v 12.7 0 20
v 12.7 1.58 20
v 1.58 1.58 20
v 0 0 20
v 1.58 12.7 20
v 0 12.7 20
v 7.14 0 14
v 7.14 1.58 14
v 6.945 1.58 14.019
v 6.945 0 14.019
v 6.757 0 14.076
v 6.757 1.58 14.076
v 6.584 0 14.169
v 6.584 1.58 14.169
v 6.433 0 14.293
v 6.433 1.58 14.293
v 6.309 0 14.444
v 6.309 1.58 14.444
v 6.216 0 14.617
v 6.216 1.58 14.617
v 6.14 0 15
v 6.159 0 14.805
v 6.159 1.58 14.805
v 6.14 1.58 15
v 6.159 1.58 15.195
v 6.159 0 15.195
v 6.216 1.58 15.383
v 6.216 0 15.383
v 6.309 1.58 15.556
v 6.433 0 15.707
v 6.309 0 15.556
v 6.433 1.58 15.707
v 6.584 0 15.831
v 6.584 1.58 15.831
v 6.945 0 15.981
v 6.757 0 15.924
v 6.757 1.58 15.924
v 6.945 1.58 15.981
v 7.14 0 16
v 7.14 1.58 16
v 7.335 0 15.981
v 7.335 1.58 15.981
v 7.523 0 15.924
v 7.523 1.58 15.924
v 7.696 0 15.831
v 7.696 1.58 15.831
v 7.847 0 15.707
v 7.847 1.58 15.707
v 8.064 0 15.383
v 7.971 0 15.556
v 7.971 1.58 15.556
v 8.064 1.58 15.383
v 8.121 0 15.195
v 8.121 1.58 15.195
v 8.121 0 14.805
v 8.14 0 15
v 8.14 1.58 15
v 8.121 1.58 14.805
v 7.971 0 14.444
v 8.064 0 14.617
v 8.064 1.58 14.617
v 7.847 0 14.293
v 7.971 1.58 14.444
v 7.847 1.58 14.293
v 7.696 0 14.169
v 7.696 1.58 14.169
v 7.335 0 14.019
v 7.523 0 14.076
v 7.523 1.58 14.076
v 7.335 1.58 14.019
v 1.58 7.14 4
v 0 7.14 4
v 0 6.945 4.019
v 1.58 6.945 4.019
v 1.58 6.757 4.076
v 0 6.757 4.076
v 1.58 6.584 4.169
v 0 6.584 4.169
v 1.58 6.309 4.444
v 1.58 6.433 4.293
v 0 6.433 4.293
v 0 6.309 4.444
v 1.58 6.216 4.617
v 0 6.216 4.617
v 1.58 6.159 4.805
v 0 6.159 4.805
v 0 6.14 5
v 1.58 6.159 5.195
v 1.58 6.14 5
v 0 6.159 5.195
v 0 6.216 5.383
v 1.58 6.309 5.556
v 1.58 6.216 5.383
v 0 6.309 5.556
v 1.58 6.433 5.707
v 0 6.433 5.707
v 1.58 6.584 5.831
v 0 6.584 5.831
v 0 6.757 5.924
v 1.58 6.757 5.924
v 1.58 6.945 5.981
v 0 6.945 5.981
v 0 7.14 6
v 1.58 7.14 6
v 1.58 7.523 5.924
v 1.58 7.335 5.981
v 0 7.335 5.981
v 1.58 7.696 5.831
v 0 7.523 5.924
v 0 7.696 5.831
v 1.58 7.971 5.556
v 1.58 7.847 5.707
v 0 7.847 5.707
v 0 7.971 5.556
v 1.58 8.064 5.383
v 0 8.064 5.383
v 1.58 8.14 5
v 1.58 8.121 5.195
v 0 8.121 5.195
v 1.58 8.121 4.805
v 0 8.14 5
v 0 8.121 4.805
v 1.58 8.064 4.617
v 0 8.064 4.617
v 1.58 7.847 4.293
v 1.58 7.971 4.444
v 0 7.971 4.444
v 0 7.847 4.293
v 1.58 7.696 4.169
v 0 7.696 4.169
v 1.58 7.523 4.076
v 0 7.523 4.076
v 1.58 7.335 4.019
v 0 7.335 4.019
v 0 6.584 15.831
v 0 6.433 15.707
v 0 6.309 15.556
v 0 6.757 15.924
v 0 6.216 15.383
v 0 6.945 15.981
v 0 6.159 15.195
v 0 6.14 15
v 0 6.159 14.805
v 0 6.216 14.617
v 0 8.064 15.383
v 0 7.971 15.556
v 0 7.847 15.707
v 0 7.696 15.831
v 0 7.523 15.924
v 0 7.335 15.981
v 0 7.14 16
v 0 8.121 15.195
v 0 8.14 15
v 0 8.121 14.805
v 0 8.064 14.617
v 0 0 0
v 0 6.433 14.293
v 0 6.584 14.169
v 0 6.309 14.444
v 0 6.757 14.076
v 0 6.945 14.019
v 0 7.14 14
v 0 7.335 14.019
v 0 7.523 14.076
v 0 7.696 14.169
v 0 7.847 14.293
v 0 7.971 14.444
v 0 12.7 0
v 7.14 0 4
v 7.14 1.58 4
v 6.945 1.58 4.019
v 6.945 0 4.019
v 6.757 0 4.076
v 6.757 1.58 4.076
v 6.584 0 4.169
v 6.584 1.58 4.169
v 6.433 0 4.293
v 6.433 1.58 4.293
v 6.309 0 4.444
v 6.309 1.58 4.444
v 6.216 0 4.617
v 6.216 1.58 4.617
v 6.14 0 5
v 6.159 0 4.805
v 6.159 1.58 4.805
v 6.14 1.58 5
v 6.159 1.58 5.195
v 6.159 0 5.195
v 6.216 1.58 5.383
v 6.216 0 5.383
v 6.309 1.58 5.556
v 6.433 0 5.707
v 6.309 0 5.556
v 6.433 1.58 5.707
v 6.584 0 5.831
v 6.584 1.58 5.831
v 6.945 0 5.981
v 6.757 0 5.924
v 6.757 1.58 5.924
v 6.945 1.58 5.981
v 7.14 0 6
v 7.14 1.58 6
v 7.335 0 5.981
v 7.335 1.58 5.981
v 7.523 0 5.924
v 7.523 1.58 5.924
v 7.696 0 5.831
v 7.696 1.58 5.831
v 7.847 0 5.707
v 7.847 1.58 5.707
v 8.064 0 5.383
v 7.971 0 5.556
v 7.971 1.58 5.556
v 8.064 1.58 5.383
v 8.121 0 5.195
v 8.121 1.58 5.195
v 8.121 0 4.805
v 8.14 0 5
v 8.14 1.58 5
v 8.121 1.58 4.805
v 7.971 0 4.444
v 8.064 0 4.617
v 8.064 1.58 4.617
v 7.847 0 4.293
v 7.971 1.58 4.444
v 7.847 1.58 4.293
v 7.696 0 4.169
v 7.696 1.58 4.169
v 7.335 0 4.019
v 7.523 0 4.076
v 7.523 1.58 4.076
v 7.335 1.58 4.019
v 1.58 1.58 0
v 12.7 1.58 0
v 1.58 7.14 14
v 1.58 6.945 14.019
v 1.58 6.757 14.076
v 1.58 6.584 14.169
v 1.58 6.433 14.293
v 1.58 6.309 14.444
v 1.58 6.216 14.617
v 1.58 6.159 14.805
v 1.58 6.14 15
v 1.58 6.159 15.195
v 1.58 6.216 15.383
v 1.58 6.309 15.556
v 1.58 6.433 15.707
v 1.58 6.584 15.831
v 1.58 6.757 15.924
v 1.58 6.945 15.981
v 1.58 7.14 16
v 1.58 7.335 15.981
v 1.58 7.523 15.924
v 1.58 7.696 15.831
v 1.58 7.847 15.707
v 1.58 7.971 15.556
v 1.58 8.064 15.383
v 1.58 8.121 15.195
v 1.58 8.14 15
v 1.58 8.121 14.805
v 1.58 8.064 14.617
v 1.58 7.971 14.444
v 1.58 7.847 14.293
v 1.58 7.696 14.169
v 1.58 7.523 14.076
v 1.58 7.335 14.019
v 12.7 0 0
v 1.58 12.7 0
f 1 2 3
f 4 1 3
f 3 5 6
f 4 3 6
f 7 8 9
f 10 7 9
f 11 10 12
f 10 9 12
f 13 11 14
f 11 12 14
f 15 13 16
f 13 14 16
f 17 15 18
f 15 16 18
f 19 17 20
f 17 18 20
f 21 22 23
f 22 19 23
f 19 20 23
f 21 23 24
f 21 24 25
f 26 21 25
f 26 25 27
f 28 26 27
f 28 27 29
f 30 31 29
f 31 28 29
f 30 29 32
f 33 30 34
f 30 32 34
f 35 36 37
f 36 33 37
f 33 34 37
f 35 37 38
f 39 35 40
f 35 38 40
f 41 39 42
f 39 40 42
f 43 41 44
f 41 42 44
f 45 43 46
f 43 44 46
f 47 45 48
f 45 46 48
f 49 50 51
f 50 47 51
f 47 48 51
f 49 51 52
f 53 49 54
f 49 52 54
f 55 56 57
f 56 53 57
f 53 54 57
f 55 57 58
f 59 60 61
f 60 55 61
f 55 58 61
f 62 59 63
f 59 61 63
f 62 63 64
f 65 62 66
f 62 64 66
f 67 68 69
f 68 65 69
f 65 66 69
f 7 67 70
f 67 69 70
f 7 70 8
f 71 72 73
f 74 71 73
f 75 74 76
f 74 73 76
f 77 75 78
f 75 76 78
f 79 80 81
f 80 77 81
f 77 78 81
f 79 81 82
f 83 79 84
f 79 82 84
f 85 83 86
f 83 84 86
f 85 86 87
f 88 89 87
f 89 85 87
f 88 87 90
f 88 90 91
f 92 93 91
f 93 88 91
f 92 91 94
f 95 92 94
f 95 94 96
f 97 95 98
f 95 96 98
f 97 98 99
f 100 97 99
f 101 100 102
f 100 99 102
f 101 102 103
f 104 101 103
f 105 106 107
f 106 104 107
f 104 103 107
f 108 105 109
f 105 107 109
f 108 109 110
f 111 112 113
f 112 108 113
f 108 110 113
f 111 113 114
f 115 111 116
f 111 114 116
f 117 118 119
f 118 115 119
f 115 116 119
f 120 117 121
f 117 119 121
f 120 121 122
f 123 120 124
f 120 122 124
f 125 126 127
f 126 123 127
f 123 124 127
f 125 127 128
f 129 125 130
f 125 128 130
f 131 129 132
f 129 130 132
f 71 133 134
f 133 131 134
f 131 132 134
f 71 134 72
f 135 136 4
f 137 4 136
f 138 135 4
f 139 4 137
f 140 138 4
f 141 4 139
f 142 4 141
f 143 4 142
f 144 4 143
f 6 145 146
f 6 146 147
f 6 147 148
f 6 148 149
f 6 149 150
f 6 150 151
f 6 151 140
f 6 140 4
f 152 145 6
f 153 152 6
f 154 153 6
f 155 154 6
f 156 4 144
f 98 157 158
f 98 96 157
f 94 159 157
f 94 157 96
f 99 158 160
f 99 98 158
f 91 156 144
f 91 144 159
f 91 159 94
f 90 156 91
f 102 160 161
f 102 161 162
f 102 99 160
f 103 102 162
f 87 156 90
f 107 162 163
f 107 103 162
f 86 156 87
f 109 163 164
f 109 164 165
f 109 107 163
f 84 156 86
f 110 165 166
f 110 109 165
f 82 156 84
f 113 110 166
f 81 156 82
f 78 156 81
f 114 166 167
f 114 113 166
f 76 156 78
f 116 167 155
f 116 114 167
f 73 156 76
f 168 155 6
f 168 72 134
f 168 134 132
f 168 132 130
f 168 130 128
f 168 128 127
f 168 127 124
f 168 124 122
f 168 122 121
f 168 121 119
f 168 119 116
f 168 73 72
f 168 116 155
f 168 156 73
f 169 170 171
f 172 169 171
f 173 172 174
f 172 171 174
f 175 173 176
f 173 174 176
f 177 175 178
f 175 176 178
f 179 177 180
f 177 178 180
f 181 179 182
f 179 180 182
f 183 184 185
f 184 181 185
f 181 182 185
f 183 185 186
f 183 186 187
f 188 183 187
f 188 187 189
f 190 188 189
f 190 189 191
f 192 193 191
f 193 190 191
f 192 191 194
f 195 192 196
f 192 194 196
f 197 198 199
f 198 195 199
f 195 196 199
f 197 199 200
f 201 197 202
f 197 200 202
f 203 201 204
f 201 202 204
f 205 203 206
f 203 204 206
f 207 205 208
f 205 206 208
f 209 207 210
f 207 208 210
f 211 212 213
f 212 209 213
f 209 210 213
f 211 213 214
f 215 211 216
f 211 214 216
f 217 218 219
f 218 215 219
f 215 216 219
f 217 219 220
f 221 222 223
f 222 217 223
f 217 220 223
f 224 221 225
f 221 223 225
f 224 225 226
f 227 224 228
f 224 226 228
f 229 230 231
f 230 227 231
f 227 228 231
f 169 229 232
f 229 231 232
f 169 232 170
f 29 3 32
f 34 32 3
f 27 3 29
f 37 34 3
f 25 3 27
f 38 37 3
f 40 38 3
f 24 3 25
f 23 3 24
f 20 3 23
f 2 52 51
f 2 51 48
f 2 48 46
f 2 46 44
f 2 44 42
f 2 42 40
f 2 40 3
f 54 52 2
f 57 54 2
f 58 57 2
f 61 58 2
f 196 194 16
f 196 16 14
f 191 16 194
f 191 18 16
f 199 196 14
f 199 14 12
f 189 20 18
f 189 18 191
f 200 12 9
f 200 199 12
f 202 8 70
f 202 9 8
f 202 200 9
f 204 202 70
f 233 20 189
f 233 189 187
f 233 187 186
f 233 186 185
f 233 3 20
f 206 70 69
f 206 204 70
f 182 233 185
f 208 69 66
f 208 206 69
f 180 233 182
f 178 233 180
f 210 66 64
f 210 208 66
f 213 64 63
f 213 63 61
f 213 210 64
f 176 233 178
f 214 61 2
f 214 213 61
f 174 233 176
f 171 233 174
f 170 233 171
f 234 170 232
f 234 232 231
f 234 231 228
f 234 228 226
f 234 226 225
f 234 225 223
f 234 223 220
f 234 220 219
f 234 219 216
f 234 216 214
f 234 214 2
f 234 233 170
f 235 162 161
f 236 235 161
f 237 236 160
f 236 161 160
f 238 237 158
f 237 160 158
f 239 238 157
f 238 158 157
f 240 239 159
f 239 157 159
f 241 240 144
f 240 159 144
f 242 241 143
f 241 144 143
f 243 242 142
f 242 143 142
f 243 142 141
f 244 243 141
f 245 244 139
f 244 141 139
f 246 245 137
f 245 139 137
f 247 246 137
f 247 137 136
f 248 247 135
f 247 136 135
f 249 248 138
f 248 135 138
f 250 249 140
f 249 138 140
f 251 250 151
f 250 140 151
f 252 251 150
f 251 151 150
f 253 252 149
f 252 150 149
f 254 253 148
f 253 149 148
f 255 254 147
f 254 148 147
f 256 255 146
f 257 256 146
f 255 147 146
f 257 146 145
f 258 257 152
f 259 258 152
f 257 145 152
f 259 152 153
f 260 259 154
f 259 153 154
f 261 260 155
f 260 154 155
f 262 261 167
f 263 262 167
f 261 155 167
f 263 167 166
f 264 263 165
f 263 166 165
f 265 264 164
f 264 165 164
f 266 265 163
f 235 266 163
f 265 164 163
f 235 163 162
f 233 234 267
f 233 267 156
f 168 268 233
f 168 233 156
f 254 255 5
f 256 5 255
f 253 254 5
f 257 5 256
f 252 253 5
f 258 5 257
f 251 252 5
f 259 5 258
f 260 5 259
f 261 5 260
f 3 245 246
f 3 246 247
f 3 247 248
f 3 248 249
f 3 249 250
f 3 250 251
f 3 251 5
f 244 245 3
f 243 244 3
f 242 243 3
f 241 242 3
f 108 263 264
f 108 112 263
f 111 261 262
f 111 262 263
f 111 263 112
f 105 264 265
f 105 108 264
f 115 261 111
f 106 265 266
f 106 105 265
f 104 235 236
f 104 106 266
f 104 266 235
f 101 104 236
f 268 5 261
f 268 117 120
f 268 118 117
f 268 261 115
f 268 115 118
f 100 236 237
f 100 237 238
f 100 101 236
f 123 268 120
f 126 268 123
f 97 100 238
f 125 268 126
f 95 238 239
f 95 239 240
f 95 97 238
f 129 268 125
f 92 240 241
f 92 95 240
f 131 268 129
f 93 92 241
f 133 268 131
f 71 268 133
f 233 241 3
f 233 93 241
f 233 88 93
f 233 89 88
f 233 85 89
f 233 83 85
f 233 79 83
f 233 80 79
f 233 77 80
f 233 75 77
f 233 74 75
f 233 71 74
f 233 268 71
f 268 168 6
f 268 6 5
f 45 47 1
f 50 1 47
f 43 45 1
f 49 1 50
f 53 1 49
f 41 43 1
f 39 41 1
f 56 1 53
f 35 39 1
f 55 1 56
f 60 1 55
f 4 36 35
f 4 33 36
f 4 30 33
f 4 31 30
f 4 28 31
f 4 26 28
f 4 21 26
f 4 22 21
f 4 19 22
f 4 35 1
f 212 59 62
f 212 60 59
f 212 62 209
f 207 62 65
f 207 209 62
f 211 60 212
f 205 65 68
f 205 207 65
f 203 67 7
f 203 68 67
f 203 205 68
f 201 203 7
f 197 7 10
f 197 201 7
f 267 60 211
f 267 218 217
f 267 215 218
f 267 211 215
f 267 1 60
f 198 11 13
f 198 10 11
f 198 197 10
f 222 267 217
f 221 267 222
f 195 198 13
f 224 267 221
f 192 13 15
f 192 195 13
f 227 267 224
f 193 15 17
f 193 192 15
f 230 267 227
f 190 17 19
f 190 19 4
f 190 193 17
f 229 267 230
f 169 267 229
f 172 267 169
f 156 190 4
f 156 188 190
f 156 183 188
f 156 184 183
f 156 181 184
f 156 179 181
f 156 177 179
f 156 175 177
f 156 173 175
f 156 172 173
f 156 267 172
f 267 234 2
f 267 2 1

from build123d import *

# Parameters (mm, degrees)
BOSS_EXTRUDE1_DEPTH = 20
CUT_EXTRUDE1_REACH  = 28.881
CIRPATTERN1_COUNT   = 2
CIRPATTERN1_ANGLE   = 90


with BuildPart() as part:
    # Sketch1 → Boss-Extrude1 (new body)
    with BuildSketch(Plane.XY):
        Polygon((0, 0), (0, 12.7), (1.58, 12.7), (1.58, 1.58), (12.7, 1.58), (12.7, 0), align=None)
    extrude(amount=BOSS_EXTRUDE1_DEPTH)

    # Sketch2 → Cut-Extrude1 (cut, up to next)
    with BuildSketch(Plane.ZY, mode=Mode.PRIVATE) as cut_extrude1_sk1:
        with BuildLine():
            ThreePointArc((4, 7.14), (5, 6.14), (6, 7.14))
            Line((6, 7.14), (4, 7.14))
        make_face()
    cut_extrude1_tool1 = extrude(cut_extrude1_sk1.sketch, amount=-CUT_EXTRUDE1_REACH, mode=Mode.PRIVATE) & part.part
    # Sketch2 → Cut-Extrude1 (cut, up to next)
    with BuildSketch(Plane.ZY, mode=Mode.PRIVATE) as cut_extrude1_sk2:
        with BuildLine():
            Line((4, 7.14), (6, 7.14))
            ThreePointArc((6, 7.14), (5, 8.14), (4, 7.14))
        make_face()
    cut_extrude1_tool2 = extrude(cut_extrude1_sk2.sketch, amount=-CUT_EXTRUDE1_REACH, mode=Mode.PRIVATE) & part.part
    # Sketch2 → Cut-Extrude1 (cut, up to next)
    with BuildSketch(Plane.ZY, mode=Mode.PRIVATE) as cut_extrude1_sk3:
        with BuildLine():
            ThreePointArc((4, 7.14), (5, 6.14), (6, 7.14))
            Line((6, 7.14), (4, 7.14))
        make_face()
    cut_extrude1_tool3 = extrude(cut_extrude1_sk3.sketch, amount=-CUT_EXTRUDE1_REACH, mode=Mode.PRIVATE) & part.part
    # Sketch2 → Cut-Extrude1 (cut, up to next)
    with BuildSketch(Plane.ZY, mode=Mode.PRIVATE) as cut_extrude1_sk4:
        with BuildLine():
            Line((4, 7.14), (6, 7.14))
            ThreePointArc((6, 7.14), (5, 8.14), (4, 7.14))
        make_face()
    cut_extrude1_tool4 = extrude(cut_extrude1_sk4.sketch, amount=-CUT_EXTRUDE1_REACH, mode=Mode.PRIVATE) & part.part
    # Sketch2 → Cut-Extrude1 (cut, up to next)
    with BuildSketch(Plane.ZY, mode=Mode.PRIVATE) as cut_extrude1_sk5:
        with BuildLine():
            ThreePointArc((16, 7.14), (15, 8.14), (14, 7.14))
            Line((14, 7.14), (16, 7.14))
        make_face()
    cut_extrude1_tool5 = extrude(cut_extrude1_sk5.sketch, amount=-CUT_EXTRUDE1_REACH, mode=Mode.PRIVATE) & part.part
    # Sketch2 → Cut-Extrude1 (cut, up to next)
    with BuildSketch(Plane.ZY, mode=Mode.PRIVATE) as cut_extrude1_sk6:
        with BuildLine():
            Line((16, 7.14), (14, 7.14))
            ThreePointArc((14, 7.14), (15, 6.14), (16, 7.14))
        make_face()
    cut_extrude1_tool6 = extrude(cut_extrude1_sk6.sketch, amount=-CUT_EXTRUDE1_REACH, mode=Mode.PRIVATE) & part.part
    # Sketch2 → Cut-Extrude1 (cut, up to next)
    with BuildSketch(Plane.ZY, mode=Mode.PRIVATE) as cut_extrude1_sk7:
        with BuildLine():
            ThreePointArc((16, 7.14), (15, 8.14), (14, 7.14))
            Line((14, 7.14), (16, 7.14))
        make_face()
    cut_extrude1_tool7 = extrude(cut_extrude1_sk7.sketch, amount=-CUT_EXTRUDE1_REACH, mode=Mode.PRIVATE) & part.part
    # Sketch2 → Cut-Extrude1 (cut, up to next)
    with BuildSketch(Plane.ZY, mode=Mode.PRIVATE) as cut_extrude1_sk8:
        with BuildLine():
            Line((16, 7.14), (14, 7.14))
            ThreePointArc((14, 7.14), (15, 6.14), (16, 7.14))
        make_face()
    cut_extrude1_tool8 = extrude(cut_extrude1_sk8.sketch, amount=-CUT_EXTRUDE1_REACH, mode=Mode.PRIVATE) & part.part
    cut_extrude1_1 = cut_extrude1_tool1.solids().sort_by_distance((0, 6.715587, 5))[0]
    add(cut_extrude1_1, mode=Mode.SUBTRACT)
    cut_extrude1_2 = cut_extrude1_tool2.solids().sort_by_distance((0, 7.564413, 5))[0]
    add(cut_extrude1_2, mode=Mode.SUBTRACT)
    cut_extrude1_3 = cut_extrude1_tool3.solids().sort_by_distance((0, 6.715587, 5))[0]
    add(cut_extrude1_3, mode=Mode.SUBTRACT)
    cut_extrude1_4 = cut_extrude1_tool4.solids().sort_by_distance((0, 7.564413, 5))[0]
    add(cut_extrude1_4, mode=Mode.SUBTRACT)
    cut_extrude1_5 = cut_extrude1_tool5.solids().sort_by_distance((0, 7.564413, 15))[0]
    add(cut_extrude1_5, mode=Mode.SUBTRACT)
    cut_extrude1_6 = cut_extrude1_tool6.solids().sort_by_distance((0, 6.715587, 15))[0]
    add(cut_extrude1_6, mode=Mode.SUBTRACT)
    cut_extrude1_7 = cut_extrude1_tool7.solids().sort_by_distance((0, 7.564413, 15))[0]
    add(cut_extrude1_7, mode=Mode.SUBTRACT)
    cut_extrude1_8 = cut_extrude1_tool8.solids().sort_by_distance((0, 6.715587, 15))[0]
    add(cut_extrude1_8, mode=Mode.SUBTRACT)
    cut_extrude1 = cut_extrude1_1 + cut_extrude1_2 + cut_extrude1_3 + cut_extrude1_4 + cut_extrude1_5 + cut_extrude1_6 + cut_extrude1_7 + cut_extrude1_8  # Cut-Extrude1 as one shape, for the pattern or mirror that repeats it

    # CirPattern1: Cut-Extrude1; each copy of Cut-Extrude1 runs up to whatever stops it at its own place
    cirpattern1_before = part.part  # the part as the pattern finds it: every copy runs up to it
    cirpattern1_cut_extrude1_long1 = extrude(cut_extrude1_sk1.sketch, amount=-CUT_EXTRUDE1_REACH, mode=Mode.PRIVATE)
    cirpattern1_cut_extrude1_long2 = extrude(cut_extrude1_sk2.sketch, amount=-CUT_EXTRUDE1_REACH, mode=Mode.PRIVATE)
    cirpattern1_cut_extrude1_long3 = extrude(cut_extrude1_sk3.sketch, amount=-CUT_EXTRUDE1_REACH, mode=Mode.PRIVATE)
    cirpattern1_cut_extrude1_long4 = extrude(cut_extrude1_sk4.sketch, amount=-CUT_EXTRUDE1_REACH, mode=Mode.PRIVATE)
    cirpattern1_cut_extrude1_long5 = extrude(cut_extrude1_sk5.sketch, amount=-CUT_EXTRUDE1_REACH, mode=Mode.PRIVATE)
    cirpattern1_cut_extrude1_long6 = extrude(cut_extrude1_sk6.sketch, amount=-CUT_EXTRUDE1_REACH, mode=Mode.PRIVATE)
    cirpattern1_cut_extrude1_long7 = extrude(cut_extrude1_sk7.sketch, amount=-CUT_EXTRUDE1_REACH, mode=Mode.PRIVATE)
    cirpattern1_cut_extrude1_long8 = extrude(cut_extrude1_sk8.sketch, amount=-CUT_EXTRUDE1_REACH, mode=Mode.PRIVATE)
    cirpattern1_cut_extrude1_tool1_1 = cirpattern1_cut_extrude1_long1.rotate(Axis((1.58, 1.58, 20), (0, 0, -1)), 1 * CIRPATTERN1_ANGLE / (CIRPATTERN1_COUNT - 1)) & cirpattern1_before
    add(cirpattern1_cut_extrude1_tool1_1.solids().sort_by_distance((6.715587, 3.16, 5))[0], mode=Mode.SUBTRACT)
    cirpattern1_cut_extrude1_tool2_1 = cirpattern1_cut_extrude1_long2.rotate(Axis((1.58, 1.58, 20), (0, 0, -1)), 1 * CIRPATTERN1_ANGLE / (CIRPATTERN1_COUNT - 1)) & cirpattern1_before
    add(cirpattern1_cut_extrude1_tool2_1.solids().sort_by_distance((7.564413, 3.16, 5))[0], mode=Mode.SUBTRACT)
    cirpattern1_cut_extrude1_tool3_1 = cirpattern1_cut_extrude1_long3.rotate(Axis((1.58, 1.58, 20), (0, 0, -1)), 1 * CIRPATTERN1_ANGLE / (CIRPATTERN1_COUNT - 1)) & cirpattern1_before
    add(cirpattern1_cut_extrude1_tool3_1.solids().sort_by_distance((6.715587, 3.16, 5))[0], mode=Mode.SUBTRACT)
    cirpattern1_cut_extrude1_tool4_1 = cirpattern1_cut_extrude1_long4.rotate(Axis((1.58, 1.58, 20), (0, 0, -1)), 1 * CIRPATTERN1_ANGLE / (CIRPATTERN1_COUNT - 1)) & cirpattern1_before
    add(cirpattern1_cut_extrude1_tool4_1.solids().sort_by_distance((7.564413, 3.16, 5))[0], mode=Mode.SUBTRACT)
    cirpattern1_cut_extrude1_tool5_1 = cirpattern1_cut_extrude1_long5.rotate(Axis((1.58, 1.58, 20), (0, 0, -1)), 1 * CIRPATTERN1_ANGLE / (CIRPATTERN1_COUNT - 1)) & cirpattern1_before
    add(cirpattern1_cut_extrude1_tool5_1.solids().sort_by_distance((7.564413, 3.16, 15))[0], mode=Mode.SUBTRACT)
    cirpattern1_cut_extrude1_tool6_1 = cirpattern1_cut_extrude1_long6.rotate(Axis((1.58, 1.58, 20), (0, 0, -1)), 1 * CIRPATTERN1_ANGLE / (CIRPATTERN1_COUNT - 1)) & cirpattern1_before
    add(cirpattern1_cut_extrude1_tool6_1.solids().sort_by_distance((6.715587, 3.16, 15))[0], mode=Mode.SUBTRACT)
    cirpattern1_cut_extrude1_tool7_1 = cirpattern1_cut_extrude1_long7.rotate(Axis((1.58, 1.58, 20), (0, 0, -1)), 1 * CIRPATTERN1_ANGLE / (CIRPATTERN1_COUNT - 1)) & cirpattern1_before
    add(cirpattern1_cut_extrude1_tool7_1.solids().sort_by_distance((7.564413, 3.16, 15))[0], mode=Mode.SUBTRACT)
    cirpattern1_cut_extrude1_tool8_1 = cirpattern1_cut_extrude1_long8.rotate(Axis((1.58, 1.58, 20), (0, 0, -1)), 1 * CIRPATTERN1_ANGLE / (CIRPATTERN1_COUNT - 1)) & cirpattern1_before
    add(cirpattern1_cut_extrude1_tool8_1.solids().sort_by_distance((6.715587, 3.16, 15))[0], mode=Mode.SUBTRACT)


solid = part.part
